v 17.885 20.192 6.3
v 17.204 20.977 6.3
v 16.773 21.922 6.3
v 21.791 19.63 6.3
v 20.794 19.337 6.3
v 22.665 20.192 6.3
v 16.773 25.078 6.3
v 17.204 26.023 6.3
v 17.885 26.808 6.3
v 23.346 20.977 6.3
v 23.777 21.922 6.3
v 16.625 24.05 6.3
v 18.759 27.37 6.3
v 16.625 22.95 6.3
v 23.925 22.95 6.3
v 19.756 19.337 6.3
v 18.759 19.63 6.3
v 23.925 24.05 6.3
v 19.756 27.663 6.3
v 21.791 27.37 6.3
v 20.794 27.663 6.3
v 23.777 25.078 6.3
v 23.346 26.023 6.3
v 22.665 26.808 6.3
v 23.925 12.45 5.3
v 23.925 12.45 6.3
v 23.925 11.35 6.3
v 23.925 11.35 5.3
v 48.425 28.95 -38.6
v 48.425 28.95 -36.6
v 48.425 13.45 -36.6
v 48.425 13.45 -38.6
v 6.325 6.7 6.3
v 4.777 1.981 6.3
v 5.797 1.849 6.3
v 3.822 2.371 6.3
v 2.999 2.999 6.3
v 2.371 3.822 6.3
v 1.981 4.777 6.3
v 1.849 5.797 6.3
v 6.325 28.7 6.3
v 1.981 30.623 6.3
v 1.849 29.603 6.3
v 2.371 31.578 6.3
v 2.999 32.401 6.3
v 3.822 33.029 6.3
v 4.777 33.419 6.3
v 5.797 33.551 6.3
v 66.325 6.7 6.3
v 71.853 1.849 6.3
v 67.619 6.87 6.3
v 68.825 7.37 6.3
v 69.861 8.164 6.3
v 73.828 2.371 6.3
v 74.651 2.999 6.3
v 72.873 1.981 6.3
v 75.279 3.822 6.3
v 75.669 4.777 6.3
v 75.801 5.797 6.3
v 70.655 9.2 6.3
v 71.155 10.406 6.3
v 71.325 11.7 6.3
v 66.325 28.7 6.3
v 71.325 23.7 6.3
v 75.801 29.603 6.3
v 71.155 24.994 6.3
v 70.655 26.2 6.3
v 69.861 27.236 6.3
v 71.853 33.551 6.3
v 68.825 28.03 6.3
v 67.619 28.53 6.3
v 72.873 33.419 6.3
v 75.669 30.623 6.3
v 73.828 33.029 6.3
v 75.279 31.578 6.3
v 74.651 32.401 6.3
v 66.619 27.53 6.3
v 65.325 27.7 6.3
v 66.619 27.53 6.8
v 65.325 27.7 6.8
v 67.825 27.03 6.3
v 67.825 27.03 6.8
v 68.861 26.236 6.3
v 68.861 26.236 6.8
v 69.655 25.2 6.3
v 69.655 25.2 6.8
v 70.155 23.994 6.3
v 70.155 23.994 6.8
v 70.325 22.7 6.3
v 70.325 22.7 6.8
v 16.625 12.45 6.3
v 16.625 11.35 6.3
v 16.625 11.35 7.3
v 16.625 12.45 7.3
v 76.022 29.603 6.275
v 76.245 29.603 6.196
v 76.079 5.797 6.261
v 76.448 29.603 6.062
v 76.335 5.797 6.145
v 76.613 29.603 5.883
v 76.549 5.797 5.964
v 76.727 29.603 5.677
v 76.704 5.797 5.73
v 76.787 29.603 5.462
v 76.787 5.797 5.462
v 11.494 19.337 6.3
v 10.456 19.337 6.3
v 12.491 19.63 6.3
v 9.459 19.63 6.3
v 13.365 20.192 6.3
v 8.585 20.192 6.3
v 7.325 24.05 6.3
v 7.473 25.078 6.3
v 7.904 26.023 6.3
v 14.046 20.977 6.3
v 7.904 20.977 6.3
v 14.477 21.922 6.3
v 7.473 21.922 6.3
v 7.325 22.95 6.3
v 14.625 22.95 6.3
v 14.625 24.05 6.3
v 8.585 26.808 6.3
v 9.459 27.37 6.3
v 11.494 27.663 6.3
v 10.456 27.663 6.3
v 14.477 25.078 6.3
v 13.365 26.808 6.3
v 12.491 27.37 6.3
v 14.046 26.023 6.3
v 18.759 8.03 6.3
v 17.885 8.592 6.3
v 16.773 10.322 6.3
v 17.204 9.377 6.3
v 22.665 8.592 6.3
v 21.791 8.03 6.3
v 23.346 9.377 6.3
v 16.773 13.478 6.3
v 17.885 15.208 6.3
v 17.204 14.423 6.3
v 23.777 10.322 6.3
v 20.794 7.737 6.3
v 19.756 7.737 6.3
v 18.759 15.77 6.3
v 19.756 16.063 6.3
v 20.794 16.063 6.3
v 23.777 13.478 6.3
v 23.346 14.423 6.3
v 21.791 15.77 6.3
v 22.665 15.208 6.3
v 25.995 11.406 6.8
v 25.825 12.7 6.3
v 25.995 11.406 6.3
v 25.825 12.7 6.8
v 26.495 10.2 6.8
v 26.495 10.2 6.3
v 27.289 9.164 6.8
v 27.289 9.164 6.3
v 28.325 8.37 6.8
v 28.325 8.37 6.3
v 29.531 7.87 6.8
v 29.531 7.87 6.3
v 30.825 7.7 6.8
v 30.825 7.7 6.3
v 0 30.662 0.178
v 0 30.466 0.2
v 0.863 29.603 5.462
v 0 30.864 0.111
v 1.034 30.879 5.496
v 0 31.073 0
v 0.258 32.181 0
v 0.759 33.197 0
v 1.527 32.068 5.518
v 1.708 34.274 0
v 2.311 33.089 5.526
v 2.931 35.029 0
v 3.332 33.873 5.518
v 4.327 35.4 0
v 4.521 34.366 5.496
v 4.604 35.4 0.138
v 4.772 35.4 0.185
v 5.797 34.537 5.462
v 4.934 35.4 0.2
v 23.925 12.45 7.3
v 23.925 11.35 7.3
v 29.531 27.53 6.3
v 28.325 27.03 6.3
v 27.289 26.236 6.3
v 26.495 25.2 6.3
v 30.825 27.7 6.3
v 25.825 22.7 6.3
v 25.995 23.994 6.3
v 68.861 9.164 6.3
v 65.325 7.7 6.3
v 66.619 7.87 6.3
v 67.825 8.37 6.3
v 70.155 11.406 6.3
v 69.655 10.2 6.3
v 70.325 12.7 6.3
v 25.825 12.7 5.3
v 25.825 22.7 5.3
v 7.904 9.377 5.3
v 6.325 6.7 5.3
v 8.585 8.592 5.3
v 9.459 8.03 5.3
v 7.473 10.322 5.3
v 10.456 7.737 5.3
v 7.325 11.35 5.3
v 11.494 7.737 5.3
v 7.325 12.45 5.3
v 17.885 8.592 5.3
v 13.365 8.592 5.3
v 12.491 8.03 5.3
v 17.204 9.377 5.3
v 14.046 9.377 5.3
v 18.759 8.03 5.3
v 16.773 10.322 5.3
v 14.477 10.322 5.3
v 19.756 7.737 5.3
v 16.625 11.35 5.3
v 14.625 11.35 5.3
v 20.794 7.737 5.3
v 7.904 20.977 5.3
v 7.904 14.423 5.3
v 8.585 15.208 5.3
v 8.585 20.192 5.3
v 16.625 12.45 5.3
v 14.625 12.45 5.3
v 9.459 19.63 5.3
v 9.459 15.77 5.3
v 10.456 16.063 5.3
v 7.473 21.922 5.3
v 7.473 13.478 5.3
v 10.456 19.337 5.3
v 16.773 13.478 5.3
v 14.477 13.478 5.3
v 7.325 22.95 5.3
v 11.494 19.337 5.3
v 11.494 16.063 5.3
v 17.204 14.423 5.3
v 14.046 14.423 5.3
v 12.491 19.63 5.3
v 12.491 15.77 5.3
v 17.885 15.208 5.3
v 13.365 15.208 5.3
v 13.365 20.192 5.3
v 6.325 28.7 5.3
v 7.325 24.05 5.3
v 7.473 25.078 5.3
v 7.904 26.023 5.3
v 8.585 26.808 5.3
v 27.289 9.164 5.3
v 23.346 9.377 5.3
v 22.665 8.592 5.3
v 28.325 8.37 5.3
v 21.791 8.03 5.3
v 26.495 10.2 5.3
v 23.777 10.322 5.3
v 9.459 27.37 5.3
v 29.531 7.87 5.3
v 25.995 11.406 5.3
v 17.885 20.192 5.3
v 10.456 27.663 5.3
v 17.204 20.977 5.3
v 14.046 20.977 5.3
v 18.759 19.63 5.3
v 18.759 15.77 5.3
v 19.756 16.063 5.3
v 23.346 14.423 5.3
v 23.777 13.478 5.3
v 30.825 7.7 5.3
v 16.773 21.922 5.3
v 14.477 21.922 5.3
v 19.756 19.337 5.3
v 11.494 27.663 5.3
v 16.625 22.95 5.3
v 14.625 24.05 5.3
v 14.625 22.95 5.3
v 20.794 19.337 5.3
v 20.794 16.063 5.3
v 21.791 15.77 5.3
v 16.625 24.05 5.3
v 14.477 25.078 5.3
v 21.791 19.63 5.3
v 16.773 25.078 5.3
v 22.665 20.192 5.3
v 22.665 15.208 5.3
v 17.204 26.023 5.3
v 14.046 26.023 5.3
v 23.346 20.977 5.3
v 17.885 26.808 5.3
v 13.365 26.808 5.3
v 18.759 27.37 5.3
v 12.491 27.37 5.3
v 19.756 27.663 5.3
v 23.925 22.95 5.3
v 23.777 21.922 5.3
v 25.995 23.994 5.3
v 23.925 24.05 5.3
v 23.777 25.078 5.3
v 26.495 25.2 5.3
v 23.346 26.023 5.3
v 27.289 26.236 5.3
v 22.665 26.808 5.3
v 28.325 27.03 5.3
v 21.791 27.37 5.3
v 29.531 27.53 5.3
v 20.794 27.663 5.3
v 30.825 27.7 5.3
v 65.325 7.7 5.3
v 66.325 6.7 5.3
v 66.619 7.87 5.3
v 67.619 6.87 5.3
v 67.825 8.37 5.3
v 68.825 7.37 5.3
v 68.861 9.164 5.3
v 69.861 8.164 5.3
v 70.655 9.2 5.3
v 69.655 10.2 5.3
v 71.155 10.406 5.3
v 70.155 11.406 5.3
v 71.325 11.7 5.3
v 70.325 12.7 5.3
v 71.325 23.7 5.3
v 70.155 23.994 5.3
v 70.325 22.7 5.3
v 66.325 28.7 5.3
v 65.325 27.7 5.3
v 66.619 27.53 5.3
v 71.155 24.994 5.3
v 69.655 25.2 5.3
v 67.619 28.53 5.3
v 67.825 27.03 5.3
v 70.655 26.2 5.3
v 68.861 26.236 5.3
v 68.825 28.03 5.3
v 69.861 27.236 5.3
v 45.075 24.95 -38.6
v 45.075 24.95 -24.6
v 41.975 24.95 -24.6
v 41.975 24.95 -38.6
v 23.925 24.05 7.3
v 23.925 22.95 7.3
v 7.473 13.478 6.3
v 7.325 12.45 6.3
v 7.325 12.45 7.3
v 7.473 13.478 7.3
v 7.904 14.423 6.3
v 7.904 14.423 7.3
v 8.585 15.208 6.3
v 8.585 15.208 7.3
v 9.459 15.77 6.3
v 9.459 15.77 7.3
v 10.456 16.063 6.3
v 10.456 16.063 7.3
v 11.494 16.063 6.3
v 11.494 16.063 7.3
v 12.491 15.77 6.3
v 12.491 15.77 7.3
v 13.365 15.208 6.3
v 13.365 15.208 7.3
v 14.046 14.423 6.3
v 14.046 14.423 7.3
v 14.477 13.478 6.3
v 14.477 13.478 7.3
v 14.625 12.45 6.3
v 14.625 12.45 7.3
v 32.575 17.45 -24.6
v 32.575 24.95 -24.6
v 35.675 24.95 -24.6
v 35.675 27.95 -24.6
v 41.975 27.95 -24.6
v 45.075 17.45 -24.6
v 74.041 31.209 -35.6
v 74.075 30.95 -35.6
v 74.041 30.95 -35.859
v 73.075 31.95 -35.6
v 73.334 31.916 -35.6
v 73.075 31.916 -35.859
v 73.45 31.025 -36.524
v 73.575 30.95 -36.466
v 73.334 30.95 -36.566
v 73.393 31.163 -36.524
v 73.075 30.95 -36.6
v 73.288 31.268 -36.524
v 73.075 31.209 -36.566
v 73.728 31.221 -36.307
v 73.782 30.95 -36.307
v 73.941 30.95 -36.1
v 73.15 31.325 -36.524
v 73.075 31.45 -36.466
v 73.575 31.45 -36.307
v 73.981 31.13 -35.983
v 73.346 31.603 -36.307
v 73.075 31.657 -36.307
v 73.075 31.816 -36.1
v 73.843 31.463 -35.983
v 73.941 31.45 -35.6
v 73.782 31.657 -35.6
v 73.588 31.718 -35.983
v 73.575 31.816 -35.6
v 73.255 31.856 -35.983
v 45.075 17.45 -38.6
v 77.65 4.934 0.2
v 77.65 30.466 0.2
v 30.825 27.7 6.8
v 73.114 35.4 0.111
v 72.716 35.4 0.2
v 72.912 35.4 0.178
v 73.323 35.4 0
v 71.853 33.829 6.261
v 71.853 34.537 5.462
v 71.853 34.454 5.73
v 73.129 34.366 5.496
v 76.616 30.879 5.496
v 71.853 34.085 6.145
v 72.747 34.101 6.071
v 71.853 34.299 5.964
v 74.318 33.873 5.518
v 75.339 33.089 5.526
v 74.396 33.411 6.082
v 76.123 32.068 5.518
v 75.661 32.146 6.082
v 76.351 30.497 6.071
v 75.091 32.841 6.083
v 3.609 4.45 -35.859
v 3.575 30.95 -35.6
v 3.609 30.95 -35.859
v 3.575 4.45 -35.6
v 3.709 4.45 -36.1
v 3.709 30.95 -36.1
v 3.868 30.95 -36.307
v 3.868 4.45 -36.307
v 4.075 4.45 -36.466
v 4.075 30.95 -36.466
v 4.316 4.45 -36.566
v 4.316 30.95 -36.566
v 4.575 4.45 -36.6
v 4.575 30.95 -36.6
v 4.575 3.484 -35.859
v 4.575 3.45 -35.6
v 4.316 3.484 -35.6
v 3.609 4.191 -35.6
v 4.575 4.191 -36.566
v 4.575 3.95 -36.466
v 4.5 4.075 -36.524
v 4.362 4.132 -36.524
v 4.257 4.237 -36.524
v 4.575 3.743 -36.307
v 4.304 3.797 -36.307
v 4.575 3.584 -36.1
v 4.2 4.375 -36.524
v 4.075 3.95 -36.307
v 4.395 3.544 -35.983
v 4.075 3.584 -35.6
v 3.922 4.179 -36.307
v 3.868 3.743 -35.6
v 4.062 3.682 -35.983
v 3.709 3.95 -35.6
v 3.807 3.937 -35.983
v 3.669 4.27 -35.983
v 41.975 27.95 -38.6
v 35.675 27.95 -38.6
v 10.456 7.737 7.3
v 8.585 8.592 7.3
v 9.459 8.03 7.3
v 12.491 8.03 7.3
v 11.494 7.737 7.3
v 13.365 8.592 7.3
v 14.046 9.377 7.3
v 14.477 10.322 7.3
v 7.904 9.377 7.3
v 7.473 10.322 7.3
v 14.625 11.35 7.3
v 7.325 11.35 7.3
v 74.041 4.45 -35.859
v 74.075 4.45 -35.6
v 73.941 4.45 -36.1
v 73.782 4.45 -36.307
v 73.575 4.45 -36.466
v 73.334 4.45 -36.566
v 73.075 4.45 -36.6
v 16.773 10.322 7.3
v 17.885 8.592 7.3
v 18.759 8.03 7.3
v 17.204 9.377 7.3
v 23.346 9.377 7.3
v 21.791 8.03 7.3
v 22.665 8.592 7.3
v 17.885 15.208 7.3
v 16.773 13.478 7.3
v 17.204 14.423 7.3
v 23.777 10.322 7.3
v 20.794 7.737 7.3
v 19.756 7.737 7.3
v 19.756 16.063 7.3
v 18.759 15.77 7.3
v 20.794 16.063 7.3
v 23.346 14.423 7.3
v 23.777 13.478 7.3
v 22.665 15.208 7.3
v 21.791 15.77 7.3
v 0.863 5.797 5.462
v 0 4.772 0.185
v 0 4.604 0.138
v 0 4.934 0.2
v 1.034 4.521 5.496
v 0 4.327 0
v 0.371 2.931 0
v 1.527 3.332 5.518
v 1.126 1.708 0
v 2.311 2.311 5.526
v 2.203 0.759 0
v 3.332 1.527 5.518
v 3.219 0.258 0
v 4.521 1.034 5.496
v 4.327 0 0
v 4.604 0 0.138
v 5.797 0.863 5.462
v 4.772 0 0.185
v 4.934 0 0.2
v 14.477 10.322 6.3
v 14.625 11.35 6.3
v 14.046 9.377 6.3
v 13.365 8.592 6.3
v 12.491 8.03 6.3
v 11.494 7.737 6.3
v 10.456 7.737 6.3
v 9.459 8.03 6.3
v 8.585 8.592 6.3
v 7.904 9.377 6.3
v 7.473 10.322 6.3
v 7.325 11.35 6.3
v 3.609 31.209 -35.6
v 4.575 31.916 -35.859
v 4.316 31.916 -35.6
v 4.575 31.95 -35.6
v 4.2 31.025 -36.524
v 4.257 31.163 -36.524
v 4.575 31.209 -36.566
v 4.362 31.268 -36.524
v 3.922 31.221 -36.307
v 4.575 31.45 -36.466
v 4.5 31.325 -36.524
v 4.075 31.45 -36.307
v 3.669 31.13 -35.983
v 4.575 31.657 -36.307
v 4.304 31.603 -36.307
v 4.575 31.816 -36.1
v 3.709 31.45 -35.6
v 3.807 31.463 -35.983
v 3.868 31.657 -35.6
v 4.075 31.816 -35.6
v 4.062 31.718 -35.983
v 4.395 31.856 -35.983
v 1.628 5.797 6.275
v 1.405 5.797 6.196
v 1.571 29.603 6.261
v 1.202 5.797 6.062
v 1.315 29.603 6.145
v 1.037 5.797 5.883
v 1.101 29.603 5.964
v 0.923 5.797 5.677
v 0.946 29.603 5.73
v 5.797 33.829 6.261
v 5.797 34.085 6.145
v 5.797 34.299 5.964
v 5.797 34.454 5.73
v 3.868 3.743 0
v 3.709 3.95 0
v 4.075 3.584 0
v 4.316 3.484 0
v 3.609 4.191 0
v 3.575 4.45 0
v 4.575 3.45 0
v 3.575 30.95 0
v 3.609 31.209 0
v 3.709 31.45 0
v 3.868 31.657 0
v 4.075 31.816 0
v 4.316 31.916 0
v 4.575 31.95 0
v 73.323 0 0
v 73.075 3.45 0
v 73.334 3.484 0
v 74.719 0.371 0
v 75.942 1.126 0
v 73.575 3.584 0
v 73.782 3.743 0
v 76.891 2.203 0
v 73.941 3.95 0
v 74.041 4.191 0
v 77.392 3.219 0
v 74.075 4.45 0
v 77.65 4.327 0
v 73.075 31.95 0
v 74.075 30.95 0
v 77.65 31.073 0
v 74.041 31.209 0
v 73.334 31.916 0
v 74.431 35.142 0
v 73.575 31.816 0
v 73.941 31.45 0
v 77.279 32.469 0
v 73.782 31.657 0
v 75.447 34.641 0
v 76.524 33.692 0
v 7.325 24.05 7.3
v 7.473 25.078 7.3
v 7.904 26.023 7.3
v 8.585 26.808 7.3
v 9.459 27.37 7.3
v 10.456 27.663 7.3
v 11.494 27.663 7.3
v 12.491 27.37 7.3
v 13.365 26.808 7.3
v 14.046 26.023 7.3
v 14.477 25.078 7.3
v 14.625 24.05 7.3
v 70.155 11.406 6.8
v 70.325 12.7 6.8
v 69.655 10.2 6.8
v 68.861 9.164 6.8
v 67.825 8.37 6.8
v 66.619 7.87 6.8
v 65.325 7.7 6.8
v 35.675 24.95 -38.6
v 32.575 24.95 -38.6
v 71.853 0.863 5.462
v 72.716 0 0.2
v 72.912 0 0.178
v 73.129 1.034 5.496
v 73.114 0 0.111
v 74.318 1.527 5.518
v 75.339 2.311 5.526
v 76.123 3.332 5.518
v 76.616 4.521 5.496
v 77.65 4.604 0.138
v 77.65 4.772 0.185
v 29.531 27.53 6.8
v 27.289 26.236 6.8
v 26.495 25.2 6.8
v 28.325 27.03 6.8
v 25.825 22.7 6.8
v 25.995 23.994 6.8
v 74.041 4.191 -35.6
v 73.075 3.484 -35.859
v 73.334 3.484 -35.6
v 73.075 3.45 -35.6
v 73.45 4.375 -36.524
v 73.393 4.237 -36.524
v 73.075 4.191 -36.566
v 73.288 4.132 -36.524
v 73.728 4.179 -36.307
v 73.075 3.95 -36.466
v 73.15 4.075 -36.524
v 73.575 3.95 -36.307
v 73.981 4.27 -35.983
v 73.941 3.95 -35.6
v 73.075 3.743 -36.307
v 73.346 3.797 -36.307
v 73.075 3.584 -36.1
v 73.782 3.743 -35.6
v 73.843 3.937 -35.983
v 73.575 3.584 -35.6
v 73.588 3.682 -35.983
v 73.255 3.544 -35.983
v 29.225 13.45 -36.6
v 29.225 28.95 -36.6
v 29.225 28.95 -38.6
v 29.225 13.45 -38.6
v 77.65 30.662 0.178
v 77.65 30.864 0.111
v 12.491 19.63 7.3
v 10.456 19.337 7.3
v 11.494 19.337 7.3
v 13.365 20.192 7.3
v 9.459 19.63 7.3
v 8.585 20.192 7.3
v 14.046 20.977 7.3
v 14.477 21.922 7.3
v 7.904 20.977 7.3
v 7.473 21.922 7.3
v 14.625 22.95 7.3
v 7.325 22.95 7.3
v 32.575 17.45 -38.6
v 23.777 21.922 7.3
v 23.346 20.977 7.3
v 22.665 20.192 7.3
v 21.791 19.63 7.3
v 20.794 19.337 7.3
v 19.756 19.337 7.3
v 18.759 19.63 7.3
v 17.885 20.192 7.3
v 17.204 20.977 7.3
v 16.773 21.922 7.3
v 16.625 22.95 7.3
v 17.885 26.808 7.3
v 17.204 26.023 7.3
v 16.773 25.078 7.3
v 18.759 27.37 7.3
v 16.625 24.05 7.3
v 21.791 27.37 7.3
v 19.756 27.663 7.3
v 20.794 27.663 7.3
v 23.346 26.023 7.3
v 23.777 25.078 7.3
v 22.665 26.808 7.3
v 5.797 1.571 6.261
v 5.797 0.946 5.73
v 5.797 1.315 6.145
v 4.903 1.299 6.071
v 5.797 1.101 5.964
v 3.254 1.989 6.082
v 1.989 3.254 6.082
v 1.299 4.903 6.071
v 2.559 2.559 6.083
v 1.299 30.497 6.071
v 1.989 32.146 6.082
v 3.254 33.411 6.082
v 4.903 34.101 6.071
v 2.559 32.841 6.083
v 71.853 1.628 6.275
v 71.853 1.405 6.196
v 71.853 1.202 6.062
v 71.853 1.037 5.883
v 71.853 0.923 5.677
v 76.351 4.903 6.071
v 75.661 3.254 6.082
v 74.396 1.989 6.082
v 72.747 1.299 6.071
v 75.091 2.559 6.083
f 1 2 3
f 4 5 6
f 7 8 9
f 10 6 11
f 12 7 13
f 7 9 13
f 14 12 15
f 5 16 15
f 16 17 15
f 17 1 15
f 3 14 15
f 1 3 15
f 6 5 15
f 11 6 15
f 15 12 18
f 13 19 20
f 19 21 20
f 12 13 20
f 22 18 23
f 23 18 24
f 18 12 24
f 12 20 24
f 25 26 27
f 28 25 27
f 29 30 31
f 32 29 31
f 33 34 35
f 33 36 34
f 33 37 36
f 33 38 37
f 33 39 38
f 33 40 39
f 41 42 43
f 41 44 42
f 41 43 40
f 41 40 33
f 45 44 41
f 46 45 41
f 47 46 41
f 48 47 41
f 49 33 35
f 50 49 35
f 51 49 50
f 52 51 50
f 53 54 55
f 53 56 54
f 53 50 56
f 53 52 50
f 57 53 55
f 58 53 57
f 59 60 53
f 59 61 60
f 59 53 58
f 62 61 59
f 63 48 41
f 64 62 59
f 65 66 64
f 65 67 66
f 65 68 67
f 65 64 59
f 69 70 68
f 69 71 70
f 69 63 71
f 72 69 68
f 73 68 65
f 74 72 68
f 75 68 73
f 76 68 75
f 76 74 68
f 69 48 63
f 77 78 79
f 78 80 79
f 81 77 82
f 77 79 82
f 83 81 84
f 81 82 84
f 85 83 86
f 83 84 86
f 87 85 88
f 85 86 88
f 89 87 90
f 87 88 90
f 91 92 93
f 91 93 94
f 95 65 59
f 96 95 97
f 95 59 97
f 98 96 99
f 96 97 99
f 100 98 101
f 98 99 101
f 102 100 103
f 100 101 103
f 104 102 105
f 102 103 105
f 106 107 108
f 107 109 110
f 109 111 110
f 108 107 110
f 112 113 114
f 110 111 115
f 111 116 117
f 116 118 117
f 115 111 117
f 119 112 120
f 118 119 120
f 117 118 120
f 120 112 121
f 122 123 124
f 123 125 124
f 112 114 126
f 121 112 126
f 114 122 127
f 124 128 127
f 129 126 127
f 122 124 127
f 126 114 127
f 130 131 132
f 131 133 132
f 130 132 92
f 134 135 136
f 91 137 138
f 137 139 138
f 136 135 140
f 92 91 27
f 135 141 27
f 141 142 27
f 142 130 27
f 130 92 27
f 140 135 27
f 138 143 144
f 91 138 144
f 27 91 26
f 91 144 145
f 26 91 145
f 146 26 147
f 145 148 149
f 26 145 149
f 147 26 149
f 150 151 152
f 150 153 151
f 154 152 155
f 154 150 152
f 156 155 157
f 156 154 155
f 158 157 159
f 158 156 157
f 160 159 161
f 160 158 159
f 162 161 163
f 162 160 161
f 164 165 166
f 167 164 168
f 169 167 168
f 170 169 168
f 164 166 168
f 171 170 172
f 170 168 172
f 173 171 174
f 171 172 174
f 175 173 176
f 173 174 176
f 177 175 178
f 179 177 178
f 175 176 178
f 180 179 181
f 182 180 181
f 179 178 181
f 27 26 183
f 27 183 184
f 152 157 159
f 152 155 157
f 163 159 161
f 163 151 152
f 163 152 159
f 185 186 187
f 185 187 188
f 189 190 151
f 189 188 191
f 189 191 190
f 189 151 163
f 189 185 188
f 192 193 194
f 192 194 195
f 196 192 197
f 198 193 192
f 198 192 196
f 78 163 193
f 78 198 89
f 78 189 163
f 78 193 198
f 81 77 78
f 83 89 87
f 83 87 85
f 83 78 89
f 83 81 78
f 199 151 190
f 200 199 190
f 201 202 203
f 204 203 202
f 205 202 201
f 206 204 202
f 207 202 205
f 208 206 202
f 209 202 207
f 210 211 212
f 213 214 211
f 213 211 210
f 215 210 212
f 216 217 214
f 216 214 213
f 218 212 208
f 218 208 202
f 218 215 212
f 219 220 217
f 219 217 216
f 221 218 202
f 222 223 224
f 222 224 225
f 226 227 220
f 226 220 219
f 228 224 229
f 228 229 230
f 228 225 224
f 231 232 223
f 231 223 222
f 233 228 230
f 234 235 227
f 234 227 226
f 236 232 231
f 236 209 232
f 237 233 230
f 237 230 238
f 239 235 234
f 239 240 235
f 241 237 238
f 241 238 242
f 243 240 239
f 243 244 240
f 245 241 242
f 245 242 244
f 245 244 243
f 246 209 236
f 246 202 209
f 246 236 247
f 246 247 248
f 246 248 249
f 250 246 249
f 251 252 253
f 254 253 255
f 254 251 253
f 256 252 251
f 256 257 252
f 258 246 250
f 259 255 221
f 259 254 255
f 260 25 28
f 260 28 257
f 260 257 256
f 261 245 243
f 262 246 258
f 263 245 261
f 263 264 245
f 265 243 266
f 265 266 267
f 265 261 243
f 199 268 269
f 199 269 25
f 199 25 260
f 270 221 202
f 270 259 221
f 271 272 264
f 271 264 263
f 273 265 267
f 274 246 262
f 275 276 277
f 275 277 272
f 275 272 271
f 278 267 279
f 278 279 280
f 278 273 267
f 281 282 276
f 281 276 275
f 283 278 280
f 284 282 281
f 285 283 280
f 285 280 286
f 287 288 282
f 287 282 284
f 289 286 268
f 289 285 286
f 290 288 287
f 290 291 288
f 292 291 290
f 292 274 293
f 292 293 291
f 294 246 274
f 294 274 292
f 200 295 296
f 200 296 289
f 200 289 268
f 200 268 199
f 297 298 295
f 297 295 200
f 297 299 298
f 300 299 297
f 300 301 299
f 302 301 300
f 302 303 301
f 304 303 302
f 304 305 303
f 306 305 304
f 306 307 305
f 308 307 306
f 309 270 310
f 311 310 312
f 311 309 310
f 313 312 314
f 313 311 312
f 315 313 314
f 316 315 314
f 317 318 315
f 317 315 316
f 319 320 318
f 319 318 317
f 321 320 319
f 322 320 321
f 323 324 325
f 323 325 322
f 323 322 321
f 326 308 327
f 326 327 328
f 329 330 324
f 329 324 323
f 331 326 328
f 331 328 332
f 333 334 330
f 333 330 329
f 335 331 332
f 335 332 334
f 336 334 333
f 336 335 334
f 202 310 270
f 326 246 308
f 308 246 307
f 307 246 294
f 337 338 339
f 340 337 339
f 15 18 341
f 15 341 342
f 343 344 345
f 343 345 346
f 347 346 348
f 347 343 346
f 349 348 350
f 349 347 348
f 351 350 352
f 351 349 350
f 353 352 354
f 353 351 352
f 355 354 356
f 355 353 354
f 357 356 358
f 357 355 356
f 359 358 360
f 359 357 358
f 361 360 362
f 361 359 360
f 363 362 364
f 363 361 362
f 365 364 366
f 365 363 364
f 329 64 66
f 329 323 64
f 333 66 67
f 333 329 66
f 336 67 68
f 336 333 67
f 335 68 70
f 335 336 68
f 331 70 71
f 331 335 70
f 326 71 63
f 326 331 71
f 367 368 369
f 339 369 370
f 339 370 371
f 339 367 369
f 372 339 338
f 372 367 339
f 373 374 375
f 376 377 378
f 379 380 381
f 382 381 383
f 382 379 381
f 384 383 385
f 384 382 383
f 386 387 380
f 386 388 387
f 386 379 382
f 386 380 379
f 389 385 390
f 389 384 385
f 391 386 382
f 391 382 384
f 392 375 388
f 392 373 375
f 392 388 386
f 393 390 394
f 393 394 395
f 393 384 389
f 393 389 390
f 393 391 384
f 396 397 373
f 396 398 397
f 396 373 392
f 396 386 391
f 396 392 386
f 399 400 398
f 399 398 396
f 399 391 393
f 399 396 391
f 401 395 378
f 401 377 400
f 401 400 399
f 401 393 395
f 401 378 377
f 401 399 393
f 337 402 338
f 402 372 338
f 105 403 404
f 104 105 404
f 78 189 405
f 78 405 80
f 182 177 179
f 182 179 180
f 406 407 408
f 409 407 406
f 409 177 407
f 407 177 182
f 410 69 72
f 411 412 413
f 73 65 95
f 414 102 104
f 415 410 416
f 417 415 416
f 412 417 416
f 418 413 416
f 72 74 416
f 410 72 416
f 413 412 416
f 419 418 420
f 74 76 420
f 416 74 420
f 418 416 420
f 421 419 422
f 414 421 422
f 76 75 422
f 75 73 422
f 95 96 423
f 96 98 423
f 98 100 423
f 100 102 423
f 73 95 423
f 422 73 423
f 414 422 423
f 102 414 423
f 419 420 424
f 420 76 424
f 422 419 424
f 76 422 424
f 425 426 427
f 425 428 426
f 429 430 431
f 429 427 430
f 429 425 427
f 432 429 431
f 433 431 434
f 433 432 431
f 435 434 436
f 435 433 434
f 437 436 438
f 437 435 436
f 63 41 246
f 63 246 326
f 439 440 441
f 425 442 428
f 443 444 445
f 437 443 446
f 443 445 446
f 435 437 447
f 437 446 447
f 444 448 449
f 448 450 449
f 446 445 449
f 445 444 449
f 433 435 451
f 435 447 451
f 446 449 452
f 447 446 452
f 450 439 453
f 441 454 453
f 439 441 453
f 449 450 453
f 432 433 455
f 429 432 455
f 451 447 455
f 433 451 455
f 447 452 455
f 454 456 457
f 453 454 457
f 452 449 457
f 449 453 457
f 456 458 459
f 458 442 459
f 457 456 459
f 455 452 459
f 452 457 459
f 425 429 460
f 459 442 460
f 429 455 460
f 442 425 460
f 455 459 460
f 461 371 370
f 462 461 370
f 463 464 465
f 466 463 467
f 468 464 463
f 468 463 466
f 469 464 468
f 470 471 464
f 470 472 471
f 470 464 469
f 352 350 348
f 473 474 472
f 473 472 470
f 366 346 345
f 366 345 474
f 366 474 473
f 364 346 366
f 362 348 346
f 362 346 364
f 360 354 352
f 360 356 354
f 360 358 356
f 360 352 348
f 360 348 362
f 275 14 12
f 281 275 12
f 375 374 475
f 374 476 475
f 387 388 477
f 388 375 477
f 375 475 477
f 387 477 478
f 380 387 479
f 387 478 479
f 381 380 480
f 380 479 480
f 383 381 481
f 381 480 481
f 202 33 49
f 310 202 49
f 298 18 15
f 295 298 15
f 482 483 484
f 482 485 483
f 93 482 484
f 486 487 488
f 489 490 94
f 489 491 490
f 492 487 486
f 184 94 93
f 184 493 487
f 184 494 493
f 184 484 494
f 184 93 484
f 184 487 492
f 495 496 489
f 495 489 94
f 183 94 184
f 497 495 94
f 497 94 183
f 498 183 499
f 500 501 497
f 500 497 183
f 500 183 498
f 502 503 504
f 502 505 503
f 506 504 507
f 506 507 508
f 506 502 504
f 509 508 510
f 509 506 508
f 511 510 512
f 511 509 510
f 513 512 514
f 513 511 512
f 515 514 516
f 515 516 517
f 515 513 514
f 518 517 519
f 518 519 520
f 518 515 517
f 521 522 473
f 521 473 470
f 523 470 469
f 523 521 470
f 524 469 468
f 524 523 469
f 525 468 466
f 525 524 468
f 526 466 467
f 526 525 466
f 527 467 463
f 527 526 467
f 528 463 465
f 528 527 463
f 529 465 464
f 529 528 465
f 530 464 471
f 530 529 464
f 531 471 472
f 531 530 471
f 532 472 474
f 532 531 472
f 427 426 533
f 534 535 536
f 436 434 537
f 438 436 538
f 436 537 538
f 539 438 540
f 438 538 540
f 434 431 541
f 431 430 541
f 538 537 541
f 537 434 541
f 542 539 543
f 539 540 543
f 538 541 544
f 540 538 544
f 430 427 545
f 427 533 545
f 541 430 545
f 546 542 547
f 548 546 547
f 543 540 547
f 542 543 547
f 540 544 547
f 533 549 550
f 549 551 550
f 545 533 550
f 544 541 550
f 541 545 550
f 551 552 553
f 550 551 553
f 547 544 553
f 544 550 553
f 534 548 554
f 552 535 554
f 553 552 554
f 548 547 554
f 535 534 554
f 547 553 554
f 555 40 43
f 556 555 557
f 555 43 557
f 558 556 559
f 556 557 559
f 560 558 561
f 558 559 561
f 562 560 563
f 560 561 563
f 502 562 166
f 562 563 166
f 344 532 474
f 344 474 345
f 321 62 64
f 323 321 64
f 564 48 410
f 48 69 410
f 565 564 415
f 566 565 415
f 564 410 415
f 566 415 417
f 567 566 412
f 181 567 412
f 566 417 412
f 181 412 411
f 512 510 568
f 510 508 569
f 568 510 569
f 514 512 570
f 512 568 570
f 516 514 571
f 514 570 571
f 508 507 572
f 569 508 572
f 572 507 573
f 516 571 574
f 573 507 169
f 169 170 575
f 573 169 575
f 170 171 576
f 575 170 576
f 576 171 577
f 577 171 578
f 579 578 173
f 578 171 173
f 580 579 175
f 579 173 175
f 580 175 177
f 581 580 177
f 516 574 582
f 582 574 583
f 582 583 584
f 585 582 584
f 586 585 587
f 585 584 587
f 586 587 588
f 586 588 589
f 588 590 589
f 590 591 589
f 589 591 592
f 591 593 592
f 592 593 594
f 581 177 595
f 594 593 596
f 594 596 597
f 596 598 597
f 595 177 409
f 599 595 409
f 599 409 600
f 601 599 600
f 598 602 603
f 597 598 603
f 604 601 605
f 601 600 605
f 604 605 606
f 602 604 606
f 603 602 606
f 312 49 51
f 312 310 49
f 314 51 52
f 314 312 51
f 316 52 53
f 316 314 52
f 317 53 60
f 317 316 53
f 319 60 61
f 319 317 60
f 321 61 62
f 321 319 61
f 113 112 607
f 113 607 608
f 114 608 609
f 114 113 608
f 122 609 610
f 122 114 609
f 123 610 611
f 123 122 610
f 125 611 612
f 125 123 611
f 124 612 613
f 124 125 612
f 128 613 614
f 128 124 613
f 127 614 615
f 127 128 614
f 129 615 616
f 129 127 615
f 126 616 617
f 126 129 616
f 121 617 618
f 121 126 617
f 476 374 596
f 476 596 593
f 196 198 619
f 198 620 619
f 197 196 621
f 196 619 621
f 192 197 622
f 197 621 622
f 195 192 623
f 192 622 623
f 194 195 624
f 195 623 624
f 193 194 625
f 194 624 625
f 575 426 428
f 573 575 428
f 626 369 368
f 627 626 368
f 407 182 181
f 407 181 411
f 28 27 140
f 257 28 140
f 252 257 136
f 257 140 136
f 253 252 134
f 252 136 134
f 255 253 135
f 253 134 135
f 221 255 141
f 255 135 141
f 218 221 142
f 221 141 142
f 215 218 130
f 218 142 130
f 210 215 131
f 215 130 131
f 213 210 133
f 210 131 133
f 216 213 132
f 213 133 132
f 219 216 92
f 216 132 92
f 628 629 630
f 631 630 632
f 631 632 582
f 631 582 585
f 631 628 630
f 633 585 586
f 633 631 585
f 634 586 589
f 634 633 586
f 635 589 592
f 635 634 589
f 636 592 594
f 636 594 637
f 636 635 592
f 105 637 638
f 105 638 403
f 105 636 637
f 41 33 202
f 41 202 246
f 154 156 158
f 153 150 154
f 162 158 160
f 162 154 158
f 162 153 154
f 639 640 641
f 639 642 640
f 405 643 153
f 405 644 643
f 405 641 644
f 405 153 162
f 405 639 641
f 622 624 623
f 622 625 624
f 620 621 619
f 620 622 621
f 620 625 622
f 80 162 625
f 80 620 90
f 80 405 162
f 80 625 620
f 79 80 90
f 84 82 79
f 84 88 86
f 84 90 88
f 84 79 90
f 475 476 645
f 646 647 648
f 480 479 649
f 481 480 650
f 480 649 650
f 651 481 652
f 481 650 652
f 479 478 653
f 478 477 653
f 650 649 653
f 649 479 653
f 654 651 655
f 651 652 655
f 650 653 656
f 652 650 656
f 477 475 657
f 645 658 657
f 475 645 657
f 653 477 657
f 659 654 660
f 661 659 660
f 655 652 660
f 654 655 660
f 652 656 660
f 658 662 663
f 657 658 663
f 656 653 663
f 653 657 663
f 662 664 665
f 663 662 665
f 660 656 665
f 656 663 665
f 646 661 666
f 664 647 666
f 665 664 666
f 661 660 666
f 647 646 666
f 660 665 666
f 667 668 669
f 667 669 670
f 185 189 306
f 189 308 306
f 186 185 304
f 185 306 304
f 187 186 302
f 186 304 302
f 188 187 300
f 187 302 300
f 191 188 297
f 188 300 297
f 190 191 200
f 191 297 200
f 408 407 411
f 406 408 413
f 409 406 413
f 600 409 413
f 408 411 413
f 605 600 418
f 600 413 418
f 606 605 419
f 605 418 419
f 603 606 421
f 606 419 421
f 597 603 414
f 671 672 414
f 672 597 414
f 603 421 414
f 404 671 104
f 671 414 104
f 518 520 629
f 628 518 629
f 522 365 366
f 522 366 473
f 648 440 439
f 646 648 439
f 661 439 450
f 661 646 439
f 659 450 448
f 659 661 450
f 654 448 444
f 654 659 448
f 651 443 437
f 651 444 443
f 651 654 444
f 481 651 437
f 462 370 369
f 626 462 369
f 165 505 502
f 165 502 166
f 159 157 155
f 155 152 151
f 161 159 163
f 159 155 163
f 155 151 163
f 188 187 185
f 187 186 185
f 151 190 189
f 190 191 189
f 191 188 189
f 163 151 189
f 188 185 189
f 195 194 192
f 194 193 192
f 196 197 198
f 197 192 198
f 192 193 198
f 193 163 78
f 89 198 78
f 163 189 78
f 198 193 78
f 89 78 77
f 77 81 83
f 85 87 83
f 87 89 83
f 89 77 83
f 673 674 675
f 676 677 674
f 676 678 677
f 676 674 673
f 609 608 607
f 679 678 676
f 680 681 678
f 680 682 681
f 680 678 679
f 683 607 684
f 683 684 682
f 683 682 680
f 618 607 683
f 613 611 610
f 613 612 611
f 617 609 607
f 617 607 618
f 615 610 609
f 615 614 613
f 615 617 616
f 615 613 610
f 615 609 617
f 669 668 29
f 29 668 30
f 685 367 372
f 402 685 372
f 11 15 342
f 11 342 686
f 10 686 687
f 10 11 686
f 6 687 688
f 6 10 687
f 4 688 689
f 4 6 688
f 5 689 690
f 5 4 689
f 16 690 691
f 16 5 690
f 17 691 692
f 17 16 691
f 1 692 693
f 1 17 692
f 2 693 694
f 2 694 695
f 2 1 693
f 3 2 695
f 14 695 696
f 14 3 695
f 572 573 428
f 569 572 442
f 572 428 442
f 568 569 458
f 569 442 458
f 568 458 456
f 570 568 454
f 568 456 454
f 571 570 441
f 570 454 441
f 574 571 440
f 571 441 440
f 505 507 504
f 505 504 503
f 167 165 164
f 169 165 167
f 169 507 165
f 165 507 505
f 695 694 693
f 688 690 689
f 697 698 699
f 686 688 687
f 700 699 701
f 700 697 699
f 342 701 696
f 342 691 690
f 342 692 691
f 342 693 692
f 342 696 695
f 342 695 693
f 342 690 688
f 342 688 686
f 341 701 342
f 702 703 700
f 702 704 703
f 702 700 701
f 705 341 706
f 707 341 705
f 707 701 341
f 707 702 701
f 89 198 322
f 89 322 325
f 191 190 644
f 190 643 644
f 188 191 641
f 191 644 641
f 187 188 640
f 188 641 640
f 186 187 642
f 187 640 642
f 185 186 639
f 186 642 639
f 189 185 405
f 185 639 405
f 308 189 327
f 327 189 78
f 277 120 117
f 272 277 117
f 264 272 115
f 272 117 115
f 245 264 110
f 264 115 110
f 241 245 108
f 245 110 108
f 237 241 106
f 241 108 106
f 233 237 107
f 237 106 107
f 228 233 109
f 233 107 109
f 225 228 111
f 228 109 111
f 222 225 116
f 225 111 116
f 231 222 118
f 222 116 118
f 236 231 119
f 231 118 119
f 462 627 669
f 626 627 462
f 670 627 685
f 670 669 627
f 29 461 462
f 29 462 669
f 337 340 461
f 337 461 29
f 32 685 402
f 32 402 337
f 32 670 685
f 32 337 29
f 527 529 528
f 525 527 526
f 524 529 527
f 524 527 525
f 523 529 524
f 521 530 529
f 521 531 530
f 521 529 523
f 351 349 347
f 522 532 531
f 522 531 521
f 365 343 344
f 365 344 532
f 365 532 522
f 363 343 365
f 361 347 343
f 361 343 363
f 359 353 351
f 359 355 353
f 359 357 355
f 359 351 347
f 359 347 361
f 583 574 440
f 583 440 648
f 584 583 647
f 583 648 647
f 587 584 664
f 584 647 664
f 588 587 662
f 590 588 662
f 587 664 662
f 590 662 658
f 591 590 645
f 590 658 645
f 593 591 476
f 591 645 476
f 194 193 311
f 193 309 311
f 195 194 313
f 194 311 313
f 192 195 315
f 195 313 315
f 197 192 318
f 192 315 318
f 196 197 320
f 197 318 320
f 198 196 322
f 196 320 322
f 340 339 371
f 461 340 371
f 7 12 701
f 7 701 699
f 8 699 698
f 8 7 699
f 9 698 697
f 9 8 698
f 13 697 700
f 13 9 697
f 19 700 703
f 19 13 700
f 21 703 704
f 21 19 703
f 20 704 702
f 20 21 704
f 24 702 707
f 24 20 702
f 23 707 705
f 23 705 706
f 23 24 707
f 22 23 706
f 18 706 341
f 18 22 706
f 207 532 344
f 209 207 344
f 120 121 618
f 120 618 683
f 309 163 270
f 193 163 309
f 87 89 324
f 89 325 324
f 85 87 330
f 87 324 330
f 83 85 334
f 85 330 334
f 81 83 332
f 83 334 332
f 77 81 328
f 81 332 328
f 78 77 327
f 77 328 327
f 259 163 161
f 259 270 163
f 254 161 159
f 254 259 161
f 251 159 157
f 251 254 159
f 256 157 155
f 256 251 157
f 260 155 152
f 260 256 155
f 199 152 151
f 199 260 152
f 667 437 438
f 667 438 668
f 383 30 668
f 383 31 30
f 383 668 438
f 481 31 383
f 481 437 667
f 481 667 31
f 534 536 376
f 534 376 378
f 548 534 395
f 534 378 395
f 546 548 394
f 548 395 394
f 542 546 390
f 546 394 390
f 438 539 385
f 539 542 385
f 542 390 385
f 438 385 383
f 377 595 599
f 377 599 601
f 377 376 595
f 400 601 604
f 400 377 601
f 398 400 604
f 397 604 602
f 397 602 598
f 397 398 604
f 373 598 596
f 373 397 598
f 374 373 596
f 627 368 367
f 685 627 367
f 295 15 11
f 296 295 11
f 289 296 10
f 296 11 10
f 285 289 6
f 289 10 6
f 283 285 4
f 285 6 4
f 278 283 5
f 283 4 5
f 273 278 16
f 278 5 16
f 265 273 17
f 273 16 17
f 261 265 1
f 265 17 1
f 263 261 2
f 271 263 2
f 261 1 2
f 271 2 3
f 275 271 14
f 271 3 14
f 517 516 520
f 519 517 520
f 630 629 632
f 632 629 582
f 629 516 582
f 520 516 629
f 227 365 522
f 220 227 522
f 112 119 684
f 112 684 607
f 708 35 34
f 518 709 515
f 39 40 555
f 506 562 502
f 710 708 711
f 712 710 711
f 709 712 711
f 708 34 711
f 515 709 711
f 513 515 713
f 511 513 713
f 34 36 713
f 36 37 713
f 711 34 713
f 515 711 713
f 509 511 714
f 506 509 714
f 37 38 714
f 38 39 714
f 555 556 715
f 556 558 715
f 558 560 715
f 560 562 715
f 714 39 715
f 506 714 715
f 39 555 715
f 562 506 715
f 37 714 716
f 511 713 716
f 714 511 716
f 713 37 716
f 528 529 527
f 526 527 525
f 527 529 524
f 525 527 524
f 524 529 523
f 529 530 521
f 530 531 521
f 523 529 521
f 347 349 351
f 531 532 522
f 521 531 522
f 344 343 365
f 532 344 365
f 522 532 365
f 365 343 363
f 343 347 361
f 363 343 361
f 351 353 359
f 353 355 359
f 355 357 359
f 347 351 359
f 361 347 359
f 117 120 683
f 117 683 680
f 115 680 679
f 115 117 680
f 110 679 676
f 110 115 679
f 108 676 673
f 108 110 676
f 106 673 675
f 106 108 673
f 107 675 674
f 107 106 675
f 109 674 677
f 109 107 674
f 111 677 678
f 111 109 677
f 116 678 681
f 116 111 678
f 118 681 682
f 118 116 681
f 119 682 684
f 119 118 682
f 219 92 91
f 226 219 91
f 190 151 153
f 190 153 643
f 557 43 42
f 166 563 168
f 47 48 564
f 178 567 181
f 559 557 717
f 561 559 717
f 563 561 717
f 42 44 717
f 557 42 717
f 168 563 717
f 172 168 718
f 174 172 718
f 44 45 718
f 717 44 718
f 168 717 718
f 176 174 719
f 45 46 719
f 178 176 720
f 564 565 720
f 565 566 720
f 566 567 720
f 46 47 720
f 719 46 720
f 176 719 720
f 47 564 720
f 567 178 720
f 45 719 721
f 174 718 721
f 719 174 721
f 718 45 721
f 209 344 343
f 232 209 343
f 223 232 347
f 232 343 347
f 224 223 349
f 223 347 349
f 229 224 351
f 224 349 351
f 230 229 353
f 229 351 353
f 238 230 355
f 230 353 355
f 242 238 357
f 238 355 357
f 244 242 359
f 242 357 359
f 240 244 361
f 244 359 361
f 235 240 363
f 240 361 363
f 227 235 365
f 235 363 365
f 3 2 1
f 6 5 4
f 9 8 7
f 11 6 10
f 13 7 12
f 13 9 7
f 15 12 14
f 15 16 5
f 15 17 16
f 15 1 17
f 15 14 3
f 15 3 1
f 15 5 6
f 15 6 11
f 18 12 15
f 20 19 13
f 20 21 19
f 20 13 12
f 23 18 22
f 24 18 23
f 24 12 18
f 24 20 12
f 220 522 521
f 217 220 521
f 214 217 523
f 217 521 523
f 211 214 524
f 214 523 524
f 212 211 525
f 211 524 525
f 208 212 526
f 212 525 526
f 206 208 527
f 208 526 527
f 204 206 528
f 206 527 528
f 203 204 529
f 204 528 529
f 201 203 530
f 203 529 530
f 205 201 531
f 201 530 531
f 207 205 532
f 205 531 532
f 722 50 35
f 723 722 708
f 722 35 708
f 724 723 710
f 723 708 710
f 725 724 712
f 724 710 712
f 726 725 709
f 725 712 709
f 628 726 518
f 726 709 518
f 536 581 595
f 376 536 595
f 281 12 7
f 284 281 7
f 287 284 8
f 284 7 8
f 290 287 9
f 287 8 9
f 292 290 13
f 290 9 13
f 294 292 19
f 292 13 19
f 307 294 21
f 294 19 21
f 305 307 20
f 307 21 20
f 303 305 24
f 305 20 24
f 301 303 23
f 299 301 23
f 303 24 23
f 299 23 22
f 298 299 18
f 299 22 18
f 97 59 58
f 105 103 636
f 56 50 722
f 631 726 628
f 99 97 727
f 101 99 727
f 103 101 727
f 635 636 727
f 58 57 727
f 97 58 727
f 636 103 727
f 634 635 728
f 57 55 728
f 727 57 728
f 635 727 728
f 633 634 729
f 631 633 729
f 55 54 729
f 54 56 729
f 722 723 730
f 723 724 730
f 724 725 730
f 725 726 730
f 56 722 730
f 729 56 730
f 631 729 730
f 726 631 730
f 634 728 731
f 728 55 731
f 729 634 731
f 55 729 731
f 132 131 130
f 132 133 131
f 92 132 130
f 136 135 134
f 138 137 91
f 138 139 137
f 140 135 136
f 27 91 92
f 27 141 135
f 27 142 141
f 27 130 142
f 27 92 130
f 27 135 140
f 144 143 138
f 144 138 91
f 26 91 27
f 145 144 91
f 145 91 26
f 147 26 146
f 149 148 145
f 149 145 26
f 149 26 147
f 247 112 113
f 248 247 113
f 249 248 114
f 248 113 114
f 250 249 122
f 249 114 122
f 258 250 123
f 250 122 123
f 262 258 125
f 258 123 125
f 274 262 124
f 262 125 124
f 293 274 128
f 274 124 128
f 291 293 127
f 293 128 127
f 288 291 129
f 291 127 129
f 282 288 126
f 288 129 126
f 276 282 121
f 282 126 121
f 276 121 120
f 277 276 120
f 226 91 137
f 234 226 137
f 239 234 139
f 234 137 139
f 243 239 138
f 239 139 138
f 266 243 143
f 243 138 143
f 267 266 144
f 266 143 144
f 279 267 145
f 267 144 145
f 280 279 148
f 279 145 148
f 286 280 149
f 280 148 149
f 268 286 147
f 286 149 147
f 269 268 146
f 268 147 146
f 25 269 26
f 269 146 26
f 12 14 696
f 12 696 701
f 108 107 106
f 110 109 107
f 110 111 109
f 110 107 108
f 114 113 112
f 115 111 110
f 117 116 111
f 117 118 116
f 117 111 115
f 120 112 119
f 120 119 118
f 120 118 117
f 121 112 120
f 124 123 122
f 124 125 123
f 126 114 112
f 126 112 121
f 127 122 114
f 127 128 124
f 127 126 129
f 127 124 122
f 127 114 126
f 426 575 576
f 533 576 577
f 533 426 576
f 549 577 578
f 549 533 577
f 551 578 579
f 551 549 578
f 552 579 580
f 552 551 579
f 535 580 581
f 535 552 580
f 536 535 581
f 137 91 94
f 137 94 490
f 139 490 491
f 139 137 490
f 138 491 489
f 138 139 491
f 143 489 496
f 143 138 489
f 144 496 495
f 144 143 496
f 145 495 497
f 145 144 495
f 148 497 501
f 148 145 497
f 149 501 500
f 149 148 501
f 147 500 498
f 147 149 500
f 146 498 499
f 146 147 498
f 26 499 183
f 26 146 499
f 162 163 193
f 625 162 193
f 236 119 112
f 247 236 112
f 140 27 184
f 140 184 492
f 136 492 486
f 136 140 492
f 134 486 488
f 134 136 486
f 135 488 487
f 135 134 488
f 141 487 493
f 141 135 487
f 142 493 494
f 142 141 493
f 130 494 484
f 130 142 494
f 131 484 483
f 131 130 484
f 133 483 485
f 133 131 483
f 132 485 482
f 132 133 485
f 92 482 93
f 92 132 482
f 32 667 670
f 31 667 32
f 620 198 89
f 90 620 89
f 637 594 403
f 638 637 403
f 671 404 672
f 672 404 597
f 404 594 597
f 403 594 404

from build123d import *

# Parameters (mm, degrees)
F0_W         = 77.65
F0_H         = 35.4
F1_DEPTH     = 6.3
F2_W         = 70.5
F2_H         = 28.5
F3_DEPTH     = 36.6
F4_W         = 19.2
F4_H         = 15.5
F5_DEPTH     = 2
F6_DEPTH     = 12
F7_W         = 65
F7_H         = 22
F7_W_2       = 44.5
F7_H_2       = 20
F8_DEPTH     = 1
F9_DEPTH     = 1
F10_DEPTH    = 0.5
F11_SIZE2    = 6.1
F11_SIZE     = 1
F12_T1_DEPTH = 54.9699145881
F12_T3_DEPTH = 54.9699145881
F12_T5_DEPTH = 54.9699145881
F12_T7_DEPTH = 54.9699145881
F13_R        = 1
F14_R        = 5
F14_2_R      = 5


# Not quite as in the source:
# - a fillet or chamfer that OpenCascade refuses, or shapes differently, is made with other operations: its cross-section is extruded or revolved along the edge and cut away or added


with BuildPart() as f1:
    # F0 (on Top) → F1 (new body)
    with BuildSketch(Plane.XY):
        with Locations((38.825, 17.7)):
            Rectangle(F0_W, F0_H)
    extrude(amount=F1_DEPTH)

    # F2 (on face) → F3 (join)
    with BuildSketch(Plane(origin=(0, 0, 0), x_dir=(1, 0, 0), z_dir=(0, 0, -1))):
        with Locations((38.825, -17.7)):
            Rectangle(F2_W, F2_H)
    extrude(amount=F3_DEPTH)

    # F4 (on face) → F5 (join)
    with BuildSketch(Plane(origin=(0, 0, -36.6), x_dir=(1, 0, 0), z_dir=(0, 0, -1))):
        with Locations((38.825, -21.2)):
            Rectangle(F4_W, F4_H)
        Polygon((45.075, -17.45), (45.075, -24.95), (41.975, -24.95), (41.975, -27.95), (35.675, -27.95), (35.675, -24.95), (32.575, -24.95), (32.575, -17.45), align=None, mode=Mode.SUBTRACT)
    extrude(amount=F5_DEPTH)

    # F6 (cut): a face of the model
    f6_faces = [f1.faces().sort_by_distance(p)[0] for p in [
        (38.825, 22.0808255659, -36.6),
    ]]
    extrude(f6_faces, amount=-F6_DEPTH, mode=Mode.SUBTRACT)

    # F7 (on face) → F8 (cut)
    with BuildSketch(Plane.XY.offset(6.3)):
        with Locations((38.825, 17.7)):
            Rectangle(F7_W, F7_H)
        with BuildLine():
            ThreePointArc((14.625, 11.35), (10.975, 7.7), (7.325, 11.35))
            Line((7.325, 11.35), (7.325, 11.9))
            Line((7.325, 11.9), (7.325, 12.45))
            ThreePointArc((7.325, 12.45), (10.975, 16.1), (14.625, 12.45))
            Line((14.625, 12.45), (14.625, 11.9))
            Line((14.625, 11.9), (14.625, 11.35))
        make_face(mode=Mode.SUBTRACT)
        with BuildLine():
            ThreePointArc((16.625, 12.45), (20.275, 16.1), (23.925, 12.45))
            Line((23.925, 12.45), (23.925, 11.9))
            Line((23.925, 11.9), (23.925, 11.35))
            ThreePointArc((23.925, 11.35), (20.275, 7.7), (16.625, 11.35))
            Line((16.625, 11.35), (16.625, 11.9))
            Line((16.625, 11.9), (16.625, 12.45))
        make_face(mode=Mode.SUBTRACT)
        with BuildLine():
            Line((7.325, 23.5), (7.325, 24.05))
            ThreePointArc((7.325, 24.05), (10.975, 27.7), (14.625, 24.05))
            Line((14.625, 24.05), (14.625, 23.5))
            Line((14.625, 23.5), (14.625, 22.95))
            ThreePointArc((14.625, 22.95), (10.975, 19.3), (7.325, 22.95))
            Line((7.325, 22.95), (7.325, 23.5))
        make_face(mode=Mode.SUBTRACT)
        with BuildLine():
            ThreePointArc((16.625, 24.05), (20.275, 27.7), (23.925, 24.05))
            Line((23.925, 24.05), (23.925, 23.5))
            Line((23.925, 23.5), (23.925, 22.95))
            ThreePointArc((23.925, 22.95), (20.275, 19.3), (16.625, 22.95))
            Line((16.625, 22.95), (16.625, 23.5))
            Line((16.625, 23.5), (16.625, 24.05))
        make_face(mode=Mode.SUBTRACT)
        with Locations((48.075, 17.7)):
            Rectangle(F7_W_2, F7_H_2, mode=Mode.SUBTRACT)
    extrude(amount=-F8_DEPTH, mode=Mode.SUBTRACT)


with BuildPart() as f9:
    # F9 (new): a face of the model
    f9_faces = [f1.part.faces().sort_by_distance(p)[0] for p in [
        (20.275, 11.9, 6.3),
    ]]
    extrude(f9_faces, amount=F9_DEPTH)


with BuildPart() as f9b:
    # F9#2 (new): a face of the model
    f9_2_faces = [f1.part.faces().sort_by_distance(p)[0] for p in [
        (10.975, 11.9, 6.3),
    ]]
    extrude(f9_2_faces, amount=F9_DEPTH)


with BuildPart() as f9c:
    # F9#3 (new): a face of the model
    f9_3_faces = [f1.part.faces().sort_by_distance(p)[0] for p in [
        (10.975, 23.5, 6.3),
    ]]
    extrude(f9_3_faces, amount=F9_DEPTH)


with BuildPart() as f9d:
    # F9#4 (new): a face of the model
    f9_4_faces = [f1.part.faces().sort_by_distance(p)[0] for p in [
        (20.275, 23.5, 6.3),
    ]]
    extrude(f9_4_faces, amount=F9_DEPTH)


with BuildPart() as f10:
    # F10 (new): a face of the model
    f10_faces = [f1.part.faces().sort_by_distance(p)[0] for p in [
        (48.075, 17.7, 6.3),
    ]]
    extrude(f10_faces, amount=F10_DEPTH)

    # F14#2
    f14_2_edges = [f10.edges().sort_by_distance(p)[0] for p in [
        (25.825, 7.7, 6.55),
        (25.825, 27.7, 6.55),
        (70.325, 27.7, 6.55),
        (70.325, 7.7, 6.55),
    ]]
    fillet(f14_2_edges, radius=F14_2_R)


with BuildPart() as f1_1:
    add(f1.part)

    # F11
    f11_edges = [f1_1.edges().sort_by_distance(p)[0] for p in [
        (77.65, 17.7, 6.3),
        (38.825, 35.4, 6.3),
        (0, 17.7, 6.3),
        (38.825, 0, 6.3),
    ]]
    f11_side = f1_1.faces().sort_by_distance((0.853386, 17.7, 6.3))[0]
    chamfer(f11_edges, length=F11_SIZE, length2=F11_SIZE2, reference=f11_side)

    # F12: fillet of radius 5 on 4 edges, made by hand

    # F12_s2 → F12_t1 (cut)
    with BuildSketch(Plane(origin=(2.9757714869, 2.9757714869, 18.1522060699), x_dir=(0.7071067812, -0.7071067812, 0), z_dir=(-0.1596987728, -0.1596987728, -0.9741625141))):
        with BuildLine():
            ThreePointArc((-3.4889626693, -3.3536470115), (0, -1.9351466265), (3.4889626693, -3.3536470115))
            Line((3.4889626693, -3.3536470115), (0, 0.0451696341))
            Line((0, 0.0451696341), (-3.4889626693, -3.3536470115))
        make_face()
    extrude(amount=F12_T1_DEPTH, mode=Mode.SUBTRACT)

    # F12_s4 → F12_t3 (cut)
    with BuildSketch(Plane(origin=(-0.9954093344, 0.9954093344, 6.0719969396), x_dir=(0.7071067812, 0.7071067812, 0), z_dir=(0.1596987728, -0.1596987728, -0.9741625141))):
        with BuildLine():
            ThreePointArc((51.4178788898, 50.1345398044), (54.9068415591, 51.5530401894), (58.3958042284, 50.1345398044))
            Line((58.3958042284, 50.1345398044), (54.9068415591, 53.53335645))
            Line((54.9068415591, 53.53335645), (51.4178788898, 50.1345398044))
        make_face()
    extrude(amount=F12_T3_DEPTH, mode=Mode.SUBTRACT)

    # F12_s6 → F12_t5 (cut)
    with BuildSketch(Plane(origin=(-0.0925784239, -0.0925784239, 0.5647283856), x_dir=(-0.7071067812, 0.7071067812, 0), z_dir=(0.1596987728, 0.1596987728, -0.9741625141))):
        with BuildLine():
            ThreePointArc((-26.3862988358, 74.5193667624), (-29.8752615051, 75.9378671474), (-33.3642241744, 74.5193667624))
            Line((-33.3642241744, 74.5193667624), (-29.8752615051, 77.918183408))
            Line((-29.8752615051, 77.918183408), (-26.3862988358, 74.5193667624))
        make_face()
    extrude(amount=F12_T5_DEPTH, mode=Mode.SUBTRACT)

    # F12_s8 → F12_t7 (cut)
    with BuildSketch(Plane(origin=(2.0729405764, -2.0729405764, 12.6449375159), x_dir=(-0.7071067812, -0.7071067812, 0), z_dir=(-0.1596987728, 0.1596987728, -0.9741625141))):
        with BuildLine():
            ThreePointArc((-21.5426173847, 21.0311799464), (-25.031580054, 22.4496803314), (-28.5205427233, 21.0311799464))
            Line((-28.5205427233, 21.0311799464), (-25.031580054, 24.429996592))
            Line((-25.031580054, 24.429996592), (-21.5426173847, 21.0311799464))
        make_face()
    extrude(amount=F12_T7_DEPTH, mode=Mode.SUBTRACT)

    # F13
    f13_edges = [f1_1.edges().sort_by_distance(p)[0] for p in [
        (38.825, 34.4, 6.3),
        (3.575, 3.45, -18.3),
        (3.575, 31.95, -18.3),
        (74.075, 31.95, -18.3),
        (74.075, 3.45, -18.3),
        (74.075, 17.7, -36.6),
        (38.825, 3.45, -36.6),
        (3.575, 17.7, -36.6),
        (38.825, 31.95, -36.6),
    ]]
    fillet(f13_edges, radius=F13_R)

    # F14
    f14_edges = [f1_1.edges().sort_by_distance(p)[0] for p in [
        (25.825, 7.7, 5.8),
        (25.825, 27.7, 5.8),
        (70.325, 27.7, 5.8),
        (70.325, 7.7, 5.8),
        (71.325, 6.7, 5.8),
        (71.325, 28.7, 5.8),
    ]]
    fillet(f14_edges, radius=F14_R)


solid = Compound([f9.part, f9b.part, f9c.part, f9d.part, f10.part, f1_1.part])
